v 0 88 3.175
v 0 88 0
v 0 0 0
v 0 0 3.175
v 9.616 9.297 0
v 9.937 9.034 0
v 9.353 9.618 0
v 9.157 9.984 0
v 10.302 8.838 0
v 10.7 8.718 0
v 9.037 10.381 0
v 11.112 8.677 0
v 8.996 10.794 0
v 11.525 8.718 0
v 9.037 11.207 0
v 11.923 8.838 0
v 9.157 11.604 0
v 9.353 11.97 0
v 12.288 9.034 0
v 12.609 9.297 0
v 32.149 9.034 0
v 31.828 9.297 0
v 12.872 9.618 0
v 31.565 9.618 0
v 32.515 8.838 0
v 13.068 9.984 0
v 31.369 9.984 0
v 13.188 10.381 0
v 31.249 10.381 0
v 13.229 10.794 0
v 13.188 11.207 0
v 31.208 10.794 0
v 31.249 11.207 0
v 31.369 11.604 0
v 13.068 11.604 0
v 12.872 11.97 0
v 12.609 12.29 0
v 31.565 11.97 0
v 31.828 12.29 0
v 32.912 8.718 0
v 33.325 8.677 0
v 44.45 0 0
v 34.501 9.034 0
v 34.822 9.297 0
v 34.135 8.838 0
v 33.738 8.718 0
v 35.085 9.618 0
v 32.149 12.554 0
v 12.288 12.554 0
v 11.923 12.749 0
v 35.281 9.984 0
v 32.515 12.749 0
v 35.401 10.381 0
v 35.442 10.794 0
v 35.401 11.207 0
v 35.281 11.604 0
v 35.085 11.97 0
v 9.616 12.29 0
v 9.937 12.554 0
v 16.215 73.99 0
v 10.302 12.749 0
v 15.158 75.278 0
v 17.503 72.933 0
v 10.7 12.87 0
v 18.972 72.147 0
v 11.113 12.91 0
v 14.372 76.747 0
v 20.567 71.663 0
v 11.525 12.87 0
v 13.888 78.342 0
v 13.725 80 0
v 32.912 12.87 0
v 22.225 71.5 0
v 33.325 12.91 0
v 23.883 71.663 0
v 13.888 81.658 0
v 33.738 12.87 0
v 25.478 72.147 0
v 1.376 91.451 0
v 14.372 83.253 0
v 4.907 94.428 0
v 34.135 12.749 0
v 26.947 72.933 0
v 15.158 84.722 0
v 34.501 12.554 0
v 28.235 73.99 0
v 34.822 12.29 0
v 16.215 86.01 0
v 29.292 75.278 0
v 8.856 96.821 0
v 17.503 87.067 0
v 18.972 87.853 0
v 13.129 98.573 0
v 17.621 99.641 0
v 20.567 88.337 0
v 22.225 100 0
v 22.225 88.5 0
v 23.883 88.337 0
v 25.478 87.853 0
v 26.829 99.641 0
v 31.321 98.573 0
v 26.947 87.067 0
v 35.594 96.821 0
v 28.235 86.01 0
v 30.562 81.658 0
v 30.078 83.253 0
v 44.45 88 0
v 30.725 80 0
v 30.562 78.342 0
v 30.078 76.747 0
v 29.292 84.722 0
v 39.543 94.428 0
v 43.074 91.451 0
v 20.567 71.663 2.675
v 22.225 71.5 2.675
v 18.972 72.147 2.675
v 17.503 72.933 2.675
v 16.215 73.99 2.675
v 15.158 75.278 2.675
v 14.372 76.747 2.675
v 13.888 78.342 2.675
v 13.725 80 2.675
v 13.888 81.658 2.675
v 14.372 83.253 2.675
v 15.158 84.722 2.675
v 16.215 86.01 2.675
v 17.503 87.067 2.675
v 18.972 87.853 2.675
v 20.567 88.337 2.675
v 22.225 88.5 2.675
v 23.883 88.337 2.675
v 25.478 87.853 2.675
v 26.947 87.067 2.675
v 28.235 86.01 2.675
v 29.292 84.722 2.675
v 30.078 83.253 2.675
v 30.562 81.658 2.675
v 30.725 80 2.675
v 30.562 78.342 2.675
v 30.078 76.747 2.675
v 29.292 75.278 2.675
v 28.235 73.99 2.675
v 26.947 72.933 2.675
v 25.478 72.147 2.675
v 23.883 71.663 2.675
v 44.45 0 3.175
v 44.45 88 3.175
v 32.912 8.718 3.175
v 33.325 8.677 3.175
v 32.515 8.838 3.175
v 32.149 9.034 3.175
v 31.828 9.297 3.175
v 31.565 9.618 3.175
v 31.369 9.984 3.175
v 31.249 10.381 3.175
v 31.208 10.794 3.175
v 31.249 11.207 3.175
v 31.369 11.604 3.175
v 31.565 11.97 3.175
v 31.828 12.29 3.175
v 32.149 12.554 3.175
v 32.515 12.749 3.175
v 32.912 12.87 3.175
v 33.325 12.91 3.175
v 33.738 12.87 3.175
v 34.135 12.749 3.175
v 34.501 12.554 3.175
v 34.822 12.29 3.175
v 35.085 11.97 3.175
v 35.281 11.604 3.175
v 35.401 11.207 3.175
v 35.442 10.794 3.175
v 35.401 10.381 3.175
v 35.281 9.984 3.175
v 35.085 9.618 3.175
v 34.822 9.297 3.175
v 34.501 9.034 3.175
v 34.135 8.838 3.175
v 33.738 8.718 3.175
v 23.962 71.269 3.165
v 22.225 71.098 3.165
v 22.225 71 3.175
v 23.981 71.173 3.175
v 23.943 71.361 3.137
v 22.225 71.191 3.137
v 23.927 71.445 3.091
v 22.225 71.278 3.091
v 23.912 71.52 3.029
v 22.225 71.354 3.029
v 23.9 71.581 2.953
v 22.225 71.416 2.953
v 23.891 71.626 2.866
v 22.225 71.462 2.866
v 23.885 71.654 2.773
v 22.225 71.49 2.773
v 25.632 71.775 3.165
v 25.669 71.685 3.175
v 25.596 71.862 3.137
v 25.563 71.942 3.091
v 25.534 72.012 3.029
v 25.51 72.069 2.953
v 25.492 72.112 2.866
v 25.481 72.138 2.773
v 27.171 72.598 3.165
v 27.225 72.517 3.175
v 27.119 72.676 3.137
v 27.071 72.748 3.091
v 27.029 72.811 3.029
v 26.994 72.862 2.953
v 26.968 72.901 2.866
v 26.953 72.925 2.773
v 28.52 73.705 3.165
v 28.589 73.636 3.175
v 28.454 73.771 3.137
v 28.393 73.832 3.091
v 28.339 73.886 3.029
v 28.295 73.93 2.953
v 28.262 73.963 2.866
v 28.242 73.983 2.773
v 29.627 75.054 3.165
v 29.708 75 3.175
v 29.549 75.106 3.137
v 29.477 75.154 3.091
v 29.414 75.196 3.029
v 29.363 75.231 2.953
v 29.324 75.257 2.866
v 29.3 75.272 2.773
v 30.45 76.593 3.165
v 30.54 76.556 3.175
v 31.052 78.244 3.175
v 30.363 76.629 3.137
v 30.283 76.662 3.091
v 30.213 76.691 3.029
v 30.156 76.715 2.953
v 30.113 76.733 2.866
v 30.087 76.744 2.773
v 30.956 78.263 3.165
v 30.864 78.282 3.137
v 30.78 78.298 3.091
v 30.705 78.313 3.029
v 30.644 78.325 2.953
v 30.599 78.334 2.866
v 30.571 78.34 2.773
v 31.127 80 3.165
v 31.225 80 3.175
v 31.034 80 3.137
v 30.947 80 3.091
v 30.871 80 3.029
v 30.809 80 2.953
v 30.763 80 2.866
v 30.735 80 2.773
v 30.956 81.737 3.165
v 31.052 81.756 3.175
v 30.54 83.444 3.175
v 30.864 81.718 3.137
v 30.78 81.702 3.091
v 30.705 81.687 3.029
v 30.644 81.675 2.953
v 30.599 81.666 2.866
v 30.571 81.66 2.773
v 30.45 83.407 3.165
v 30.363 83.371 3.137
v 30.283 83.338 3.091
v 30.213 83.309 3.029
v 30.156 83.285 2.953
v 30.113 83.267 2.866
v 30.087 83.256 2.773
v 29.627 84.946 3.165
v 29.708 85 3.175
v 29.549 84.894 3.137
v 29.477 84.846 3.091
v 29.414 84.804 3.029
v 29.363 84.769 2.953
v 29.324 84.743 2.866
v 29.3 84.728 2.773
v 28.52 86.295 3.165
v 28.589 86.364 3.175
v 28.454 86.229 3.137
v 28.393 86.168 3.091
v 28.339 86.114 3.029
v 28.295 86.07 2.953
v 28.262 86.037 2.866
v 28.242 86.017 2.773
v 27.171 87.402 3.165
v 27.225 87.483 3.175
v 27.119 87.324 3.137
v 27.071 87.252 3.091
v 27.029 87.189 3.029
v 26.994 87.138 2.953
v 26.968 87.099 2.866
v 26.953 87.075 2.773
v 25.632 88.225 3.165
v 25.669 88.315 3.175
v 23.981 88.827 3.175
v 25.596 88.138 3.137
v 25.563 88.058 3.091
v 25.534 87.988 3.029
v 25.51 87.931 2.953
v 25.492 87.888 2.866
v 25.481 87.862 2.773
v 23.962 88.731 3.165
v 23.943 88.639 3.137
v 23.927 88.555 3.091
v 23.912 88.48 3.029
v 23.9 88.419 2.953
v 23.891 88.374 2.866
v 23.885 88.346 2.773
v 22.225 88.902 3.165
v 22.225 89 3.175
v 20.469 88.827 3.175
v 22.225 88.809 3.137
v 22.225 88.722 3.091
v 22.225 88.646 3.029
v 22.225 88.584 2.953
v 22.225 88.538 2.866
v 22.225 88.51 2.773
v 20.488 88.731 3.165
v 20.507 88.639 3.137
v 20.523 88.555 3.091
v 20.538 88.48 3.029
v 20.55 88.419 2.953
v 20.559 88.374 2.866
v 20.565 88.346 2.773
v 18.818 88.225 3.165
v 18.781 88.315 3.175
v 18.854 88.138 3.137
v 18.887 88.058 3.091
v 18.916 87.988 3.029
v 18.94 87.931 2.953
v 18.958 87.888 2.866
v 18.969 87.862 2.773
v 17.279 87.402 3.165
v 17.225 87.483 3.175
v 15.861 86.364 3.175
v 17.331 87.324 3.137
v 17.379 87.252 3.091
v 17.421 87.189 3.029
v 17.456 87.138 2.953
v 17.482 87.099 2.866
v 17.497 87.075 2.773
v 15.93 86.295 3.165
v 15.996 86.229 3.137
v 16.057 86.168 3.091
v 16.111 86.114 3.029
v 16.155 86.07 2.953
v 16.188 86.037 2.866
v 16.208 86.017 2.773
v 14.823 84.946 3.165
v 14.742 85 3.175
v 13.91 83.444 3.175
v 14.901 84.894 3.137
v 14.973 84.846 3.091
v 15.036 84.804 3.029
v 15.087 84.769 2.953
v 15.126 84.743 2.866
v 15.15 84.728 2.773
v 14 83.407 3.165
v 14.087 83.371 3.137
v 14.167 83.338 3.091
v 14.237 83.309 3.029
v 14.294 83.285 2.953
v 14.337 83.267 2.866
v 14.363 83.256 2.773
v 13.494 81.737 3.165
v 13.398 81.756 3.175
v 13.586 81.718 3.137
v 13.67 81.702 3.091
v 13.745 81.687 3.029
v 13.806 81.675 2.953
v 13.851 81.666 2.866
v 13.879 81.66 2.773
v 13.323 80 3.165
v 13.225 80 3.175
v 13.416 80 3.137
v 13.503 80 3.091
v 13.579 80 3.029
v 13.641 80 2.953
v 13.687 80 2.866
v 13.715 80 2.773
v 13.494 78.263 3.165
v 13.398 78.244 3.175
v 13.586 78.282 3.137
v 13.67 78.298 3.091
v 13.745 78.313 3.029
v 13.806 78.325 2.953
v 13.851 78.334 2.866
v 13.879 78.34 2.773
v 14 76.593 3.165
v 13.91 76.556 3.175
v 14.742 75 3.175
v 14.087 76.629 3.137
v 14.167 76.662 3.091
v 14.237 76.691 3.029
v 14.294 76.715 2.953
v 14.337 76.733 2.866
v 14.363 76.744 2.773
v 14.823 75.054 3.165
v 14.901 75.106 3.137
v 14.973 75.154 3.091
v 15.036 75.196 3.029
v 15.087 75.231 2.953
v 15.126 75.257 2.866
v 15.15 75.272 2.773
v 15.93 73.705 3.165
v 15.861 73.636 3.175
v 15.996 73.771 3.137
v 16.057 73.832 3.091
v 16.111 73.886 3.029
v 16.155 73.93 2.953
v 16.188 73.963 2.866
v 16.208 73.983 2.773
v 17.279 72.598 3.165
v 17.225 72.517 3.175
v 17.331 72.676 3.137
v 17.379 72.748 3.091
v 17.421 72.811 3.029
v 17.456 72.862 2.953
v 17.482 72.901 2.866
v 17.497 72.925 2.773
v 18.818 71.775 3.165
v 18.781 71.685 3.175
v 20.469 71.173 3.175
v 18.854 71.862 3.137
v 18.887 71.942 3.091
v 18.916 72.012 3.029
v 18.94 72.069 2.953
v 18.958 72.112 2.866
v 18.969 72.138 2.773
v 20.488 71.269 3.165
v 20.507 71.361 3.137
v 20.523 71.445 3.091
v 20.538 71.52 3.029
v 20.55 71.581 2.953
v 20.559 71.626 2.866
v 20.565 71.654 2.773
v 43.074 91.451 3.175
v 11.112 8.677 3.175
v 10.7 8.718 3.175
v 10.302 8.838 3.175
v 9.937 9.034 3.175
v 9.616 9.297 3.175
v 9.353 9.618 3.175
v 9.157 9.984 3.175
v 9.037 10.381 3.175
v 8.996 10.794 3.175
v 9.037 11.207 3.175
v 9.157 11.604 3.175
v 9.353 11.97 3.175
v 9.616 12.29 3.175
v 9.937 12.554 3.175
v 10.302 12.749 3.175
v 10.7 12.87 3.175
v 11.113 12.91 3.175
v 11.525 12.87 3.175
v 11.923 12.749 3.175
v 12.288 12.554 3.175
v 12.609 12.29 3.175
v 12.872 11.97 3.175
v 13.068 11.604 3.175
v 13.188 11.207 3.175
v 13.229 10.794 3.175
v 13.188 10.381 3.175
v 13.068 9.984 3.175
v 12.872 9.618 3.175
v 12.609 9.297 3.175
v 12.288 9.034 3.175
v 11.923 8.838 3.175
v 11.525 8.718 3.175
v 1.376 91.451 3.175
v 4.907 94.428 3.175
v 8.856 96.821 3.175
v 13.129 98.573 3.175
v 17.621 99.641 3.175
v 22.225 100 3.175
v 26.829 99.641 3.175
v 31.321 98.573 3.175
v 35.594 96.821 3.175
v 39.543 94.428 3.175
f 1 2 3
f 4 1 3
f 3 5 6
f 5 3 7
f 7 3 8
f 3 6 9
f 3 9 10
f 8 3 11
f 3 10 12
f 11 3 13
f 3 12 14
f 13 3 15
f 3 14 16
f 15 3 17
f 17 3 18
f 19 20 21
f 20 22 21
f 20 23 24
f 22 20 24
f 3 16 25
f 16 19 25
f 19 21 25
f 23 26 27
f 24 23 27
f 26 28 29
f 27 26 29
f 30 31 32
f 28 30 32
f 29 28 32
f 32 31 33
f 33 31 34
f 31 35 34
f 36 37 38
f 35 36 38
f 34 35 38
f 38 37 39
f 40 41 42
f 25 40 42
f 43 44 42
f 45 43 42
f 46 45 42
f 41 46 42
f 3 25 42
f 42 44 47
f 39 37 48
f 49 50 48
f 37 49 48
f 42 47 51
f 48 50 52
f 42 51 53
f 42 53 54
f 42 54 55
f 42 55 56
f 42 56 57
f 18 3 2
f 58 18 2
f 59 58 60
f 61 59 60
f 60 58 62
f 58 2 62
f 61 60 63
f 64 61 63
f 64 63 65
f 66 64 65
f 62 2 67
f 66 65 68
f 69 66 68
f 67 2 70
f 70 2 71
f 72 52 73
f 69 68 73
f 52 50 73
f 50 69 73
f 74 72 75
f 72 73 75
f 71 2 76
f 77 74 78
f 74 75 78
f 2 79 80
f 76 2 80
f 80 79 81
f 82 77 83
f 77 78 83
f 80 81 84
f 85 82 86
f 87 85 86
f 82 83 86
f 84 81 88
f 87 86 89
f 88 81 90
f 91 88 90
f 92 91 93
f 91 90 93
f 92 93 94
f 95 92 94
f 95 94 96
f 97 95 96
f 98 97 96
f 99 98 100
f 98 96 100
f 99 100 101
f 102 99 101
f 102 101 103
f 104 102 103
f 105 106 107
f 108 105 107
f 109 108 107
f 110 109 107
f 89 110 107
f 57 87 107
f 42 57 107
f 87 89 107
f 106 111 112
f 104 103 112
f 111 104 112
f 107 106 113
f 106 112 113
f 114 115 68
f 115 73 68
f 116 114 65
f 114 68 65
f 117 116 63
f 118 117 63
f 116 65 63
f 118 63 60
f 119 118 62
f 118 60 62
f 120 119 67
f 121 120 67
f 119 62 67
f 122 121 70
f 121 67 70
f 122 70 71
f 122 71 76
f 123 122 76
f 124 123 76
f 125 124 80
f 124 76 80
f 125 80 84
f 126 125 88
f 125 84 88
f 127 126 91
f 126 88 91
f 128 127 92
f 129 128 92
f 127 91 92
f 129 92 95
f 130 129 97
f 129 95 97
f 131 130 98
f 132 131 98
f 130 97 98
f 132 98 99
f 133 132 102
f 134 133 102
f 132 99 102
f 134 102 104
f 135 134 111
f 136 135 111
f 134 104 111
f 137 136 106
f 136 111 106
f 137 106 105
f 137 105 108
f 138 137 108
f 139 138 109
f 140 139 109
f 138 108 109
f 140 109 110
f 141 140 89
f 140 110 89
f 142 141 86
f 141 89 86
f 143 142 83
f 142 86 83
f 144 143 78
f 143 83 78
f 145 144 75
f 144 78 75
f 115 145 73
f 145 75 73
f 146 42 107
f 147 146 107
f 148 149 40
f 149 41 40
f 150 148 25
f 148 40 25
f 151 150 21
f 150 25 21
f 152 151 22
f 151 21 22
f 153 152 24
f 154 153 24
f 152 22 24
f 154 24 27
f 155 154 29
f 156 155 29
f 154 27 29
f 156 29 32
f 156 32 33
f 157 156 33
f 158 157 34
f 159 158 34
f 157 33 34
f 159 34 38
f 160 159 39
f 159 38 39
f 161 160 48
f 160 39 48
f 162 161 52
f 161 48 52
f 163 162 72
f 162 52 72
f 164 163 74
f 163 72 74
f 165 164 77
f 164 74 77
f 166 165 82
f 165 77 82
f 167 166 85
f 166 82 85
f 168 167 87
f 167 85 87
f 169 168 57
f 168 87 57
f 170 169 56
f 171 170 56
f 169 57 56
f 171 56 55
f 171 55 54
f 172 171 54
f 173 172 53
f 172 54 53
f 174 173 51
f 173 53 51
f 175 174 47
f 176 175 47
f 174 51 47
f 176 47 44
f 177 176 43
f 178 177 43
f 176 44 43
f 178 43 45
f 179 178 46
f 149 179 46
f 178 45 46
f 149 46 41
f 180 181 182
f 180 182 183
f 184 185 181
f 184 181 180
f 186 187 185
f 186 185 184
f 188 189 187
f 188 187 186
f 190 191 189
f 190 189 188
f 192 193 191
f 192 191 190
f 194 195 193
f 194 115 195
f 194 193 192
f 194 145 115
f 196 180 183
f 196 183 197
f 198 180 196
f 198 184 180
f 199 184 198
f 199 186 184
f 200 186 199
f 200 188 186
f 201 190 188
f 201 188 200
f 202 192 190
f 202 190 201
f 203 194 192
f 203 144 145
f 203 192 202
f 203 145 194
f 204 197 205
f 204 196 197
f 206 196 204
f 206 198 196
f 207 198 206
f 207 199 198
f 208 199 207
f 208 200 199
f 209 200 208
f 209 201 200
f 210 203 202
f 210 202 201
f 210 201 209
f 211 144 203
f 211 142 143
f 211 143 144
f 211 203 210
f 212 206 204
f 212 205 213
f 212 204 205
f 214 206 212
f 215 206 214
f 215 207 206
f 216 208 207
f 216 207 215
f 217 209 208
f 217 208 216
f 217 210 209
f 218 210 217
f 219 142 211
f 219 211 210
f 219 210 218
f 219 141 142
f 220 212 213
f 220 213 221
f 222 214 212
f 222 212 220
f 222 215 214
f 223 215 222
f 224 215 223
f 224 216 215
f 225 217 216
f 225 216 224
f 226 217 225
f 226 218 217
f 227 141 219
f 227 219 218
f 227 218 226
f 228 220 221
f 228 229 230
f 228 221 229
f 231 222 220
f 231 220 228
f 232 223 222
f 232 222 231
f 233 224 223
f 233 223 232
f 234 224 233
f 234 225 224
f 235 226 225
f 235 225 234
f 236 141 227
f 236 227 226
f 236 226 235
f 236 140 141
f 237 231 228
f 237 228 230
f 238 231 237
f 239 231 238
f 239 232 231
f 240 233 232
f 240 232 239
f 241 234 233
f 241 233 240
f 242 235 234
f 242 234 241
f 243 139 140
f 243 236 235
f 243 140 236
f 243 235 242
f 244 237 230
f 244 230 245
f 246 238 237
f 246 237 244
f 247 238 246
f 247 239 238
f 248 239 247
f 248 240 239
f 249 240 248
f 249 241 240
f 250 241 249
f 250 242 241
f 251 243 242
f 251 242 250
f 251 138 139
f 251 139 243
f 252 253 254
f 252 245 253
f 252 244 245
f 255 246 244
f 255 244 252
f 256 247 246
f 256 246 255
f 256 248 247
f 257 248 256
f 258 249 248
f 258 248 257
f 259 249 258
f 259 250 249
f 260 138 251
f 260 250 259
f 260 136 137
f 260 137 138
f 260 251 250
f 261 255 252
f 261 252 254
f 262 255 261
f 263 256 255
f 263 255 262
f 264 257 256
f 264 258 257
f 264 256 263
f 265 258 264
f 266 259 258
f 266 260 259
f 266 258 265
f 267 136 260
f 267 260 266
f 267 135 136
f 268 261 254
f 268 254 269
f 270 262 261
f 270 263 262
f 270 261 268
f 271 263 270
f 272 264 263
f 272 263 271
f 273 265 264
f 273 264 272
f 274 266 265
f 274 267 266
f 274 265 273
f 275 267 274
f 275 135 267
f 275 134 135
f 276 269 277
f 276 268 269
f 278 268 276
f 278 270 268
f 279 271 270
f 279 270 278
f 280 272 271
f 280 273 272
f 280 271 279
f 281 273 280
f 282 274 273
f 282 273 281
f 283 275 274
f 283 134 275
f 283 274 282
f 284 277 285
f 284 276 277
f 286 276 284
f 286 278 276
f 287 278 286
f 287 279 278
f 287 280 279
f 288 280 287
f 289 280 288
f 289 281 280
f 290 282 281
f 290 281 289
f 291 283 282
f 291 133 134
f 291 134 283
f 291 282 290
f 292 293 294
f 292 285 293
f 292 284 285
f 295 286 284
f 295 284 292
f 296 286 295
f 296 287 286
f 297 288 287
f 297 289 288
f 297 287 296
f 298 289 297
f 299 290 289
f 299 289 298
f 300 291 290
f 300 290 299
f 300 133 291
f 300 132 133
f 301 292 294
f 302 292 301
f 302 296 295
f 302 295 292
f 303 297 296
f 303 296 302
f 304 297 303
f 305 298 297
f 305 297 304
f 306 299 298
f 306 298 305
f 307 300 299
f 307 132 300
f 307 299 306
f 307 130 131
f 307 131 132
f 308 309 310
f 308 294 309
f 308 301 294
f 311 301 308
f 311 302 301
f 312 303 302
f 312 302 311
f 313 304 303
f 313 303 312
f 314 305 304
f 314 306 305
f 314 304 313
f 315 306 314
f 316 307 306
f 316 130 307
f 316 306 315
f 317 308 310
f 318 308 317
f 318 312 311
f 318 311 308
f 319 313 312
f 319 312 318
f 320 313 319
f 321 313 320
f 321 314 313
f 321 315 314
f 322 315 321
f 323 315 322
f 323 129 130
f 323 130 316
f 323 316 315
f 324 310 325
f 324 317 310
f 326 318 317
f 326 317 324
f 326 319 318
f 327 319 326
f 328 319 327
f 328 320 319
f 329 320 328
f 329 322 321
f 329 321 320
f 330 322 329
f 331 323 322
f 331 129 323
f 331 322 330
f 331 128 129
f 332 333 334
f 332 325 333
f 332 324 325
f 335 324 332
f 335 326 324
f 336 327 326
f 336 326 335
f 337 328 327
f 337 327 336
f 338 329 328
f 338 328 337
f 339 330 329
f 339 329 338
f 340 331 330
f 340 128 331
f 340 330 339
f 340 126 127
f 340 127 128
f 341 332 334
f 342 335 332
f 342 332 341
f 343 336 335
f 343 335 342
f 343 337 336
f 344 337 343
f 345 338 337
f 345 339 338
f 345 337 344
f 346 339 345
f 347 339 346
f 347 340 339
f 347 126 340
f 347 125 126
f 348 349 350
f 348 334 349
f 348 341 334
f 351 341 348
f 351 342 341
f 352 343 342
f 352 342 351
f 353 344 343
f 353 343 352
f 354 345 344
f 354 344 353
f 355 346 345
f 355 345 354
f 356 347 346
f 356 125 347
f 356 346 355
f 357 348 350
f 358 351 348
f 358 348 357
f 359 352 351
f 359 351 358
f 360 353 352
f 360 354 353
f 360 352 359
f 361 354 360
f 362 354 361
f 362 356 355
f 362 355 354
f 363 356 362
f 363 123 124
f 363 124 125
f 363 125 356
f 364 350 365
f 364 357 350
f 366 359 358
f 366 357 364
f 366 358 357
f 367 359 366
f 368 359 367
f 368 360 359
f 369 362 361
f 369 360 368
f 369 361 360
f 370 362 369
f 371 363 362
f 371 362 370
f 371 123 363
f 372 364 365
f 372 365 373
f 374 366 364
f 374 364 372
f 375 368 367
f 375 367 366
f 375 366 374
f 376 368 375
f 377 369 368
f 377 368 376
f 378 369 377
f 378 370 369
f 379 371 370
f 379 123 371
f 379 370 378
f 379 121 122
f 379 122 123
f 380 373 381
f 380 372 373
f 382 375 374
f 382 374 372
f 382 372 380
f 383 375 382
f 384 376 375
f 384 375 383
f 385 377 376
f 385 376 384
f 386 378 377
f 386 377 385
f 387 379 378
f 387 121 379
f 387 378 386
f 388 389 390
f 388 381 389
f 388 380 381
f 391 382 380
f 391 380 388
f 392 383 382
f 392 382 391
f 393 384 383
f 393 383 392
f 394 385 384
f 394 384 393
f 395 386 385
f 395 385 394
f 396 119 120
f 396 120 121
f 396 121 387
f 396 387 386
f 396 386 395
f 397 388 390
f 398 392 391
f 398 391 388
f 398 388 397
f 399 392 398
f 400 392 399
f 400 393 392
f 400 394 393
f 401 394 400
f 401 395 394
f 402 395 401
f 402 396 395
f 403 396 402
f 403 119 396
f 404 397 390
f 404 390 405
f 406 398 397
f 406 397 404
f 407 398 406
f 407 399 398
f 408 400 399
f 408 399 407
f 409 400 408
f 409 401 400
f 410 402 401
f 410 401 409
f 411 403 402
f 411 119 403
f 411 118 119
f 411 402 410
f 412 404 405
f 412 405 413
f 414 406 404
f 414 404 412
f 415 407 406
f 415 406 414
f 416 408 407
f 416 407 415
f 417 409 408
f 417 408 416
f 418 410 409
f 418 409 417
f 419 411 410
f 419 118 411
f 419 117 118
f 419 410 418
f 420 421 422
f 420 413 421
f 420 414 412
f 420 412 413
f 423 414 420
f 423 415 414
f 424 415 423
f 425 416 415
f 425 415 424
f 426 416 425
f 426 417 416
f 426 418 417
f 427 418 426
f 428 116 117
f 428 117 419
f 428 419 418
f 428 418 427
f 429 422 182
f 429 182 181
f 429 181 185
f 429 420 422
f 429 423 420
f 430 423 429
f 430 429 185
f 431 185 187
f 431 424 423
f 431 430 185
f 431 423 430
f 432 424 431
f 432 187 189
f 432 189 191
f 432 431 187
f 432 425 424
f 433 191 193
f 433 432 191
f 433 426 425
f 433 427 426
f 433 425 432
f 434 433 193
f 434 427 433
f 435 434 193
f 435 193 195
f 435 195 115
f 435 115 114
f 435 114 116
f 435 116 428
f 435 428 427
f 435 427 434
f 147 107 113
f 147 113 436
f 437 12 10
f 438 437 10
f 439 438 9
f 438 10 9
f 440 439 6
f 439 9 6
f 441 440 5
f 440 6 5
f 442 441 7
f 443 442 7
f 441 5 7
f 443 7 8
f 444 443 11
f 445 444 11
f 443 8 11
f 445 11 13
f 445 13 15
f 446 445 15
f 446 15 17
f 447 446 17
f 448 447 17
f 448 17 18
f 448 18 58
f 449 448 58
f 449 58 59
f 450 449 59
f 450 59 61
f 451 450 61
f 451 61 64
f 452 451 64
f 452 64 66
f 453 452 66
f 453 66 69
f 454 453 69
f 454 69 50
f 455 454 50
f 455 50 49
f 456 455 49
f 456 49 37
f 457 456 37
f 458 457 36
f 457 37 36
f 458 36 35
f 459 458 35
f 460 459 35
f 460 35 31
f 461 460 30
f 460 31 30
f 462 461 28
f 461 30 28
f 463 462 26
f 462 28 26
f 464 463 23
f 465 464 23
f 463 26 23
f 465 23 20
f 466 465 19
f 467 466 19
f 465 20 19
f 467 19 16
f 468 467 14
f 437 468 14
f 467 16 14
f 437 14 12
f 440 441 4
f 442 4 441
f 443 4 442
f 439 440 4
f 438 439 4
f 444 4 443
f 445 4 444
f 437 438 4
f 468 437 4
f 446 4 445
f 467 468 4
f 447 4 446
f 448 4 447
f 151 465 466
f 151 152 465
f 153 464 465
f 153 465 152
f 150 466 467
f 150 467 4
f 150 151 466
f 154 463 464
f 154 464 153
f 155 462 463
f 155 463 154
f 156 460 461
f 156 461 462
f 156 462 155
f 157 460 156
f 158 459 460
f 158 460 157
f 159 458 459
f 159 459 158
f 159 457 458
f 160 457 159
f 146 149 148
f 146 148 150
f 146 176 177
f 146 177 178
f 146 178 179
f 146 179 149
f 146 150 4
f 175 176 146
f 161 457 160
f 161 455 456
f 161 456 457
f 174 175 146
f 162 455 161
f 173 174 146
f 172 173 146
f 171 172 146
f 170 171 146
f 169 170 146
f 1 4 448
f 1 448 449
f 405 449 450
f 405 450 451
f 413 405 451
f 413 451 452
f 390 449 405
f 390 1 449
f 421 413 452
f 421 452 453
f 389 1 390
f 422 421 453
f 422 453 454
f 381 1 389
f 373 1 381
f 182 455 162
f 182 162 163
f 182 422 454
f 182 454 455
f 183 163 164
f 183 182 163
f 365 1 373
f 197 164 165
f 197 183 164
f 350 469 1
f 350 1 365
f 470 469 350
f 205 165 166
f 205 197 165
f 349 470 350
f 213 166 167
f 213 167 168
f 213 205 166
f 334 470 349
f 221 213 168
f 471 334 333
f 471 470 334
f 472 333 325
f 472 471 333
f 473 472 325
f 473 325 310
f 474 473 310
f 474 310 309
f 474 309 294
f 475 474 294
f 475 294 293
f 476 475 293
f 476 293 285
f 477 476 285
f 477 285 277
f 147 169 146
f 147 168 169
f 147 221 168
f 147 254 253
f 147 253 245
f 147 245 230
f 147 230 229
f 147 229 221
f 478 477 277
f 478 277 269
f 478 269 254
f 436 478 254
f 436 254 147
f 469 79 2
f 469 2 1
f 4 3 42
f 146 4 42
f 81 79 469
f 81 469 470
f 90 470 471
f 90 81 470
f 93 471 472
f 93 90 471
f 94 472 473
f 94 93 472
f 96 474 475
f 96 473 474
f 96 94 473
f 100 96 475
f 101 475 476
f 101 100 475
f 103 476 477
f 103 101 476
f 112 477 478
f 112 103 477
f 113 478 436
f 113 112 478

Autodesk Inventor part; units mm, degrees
ref_plane "YZ Plane" through (0, 0, 0) normal (1, 0, 0) x (0, 1, 0)
ref_plane "XZ Plane" through (0, 0, 0) normal (0, 1, 0) x (-1, 0, 0)
ref_plane "XY Plane" through (0, 0, 0) normal (0, 0, 1) x (1, 0, 0)
sketch "Sketch2" plane through (0, 0, 0) normal (0, 0, 1) x (1, 0, 0)
  line L0 (0, 0) -> (44.45, 0)
  line L1 (44.45, 0) -> (44.45, 90)
  line L2 (0, 90) -> (0, 0)
  arc A0 (44.45, 90) -> (0, 90) centre (22.225, 70.3025) ccw
  dimension "d3" = 44.45
  dimension "d4" = 100
  dimension "d5" = 90
extrude "Extrusion1" add sketch "Sketch2" along normal blind 3.175
chamfer "Chamfer1" distance 2 angle 45 2 edges at (44.45, 90, 1.5875) (0, 90, 1.5875)
sketch "Sketch3" plane through (0, 0, 3.175) normal (0, 0, 1) x (1, 0, 0)
  line L0 (0, 88) -> (0, 0) projected
  line L1 (0, 0) -> (44.45, 0) projected
  point P0 (22.225, 80)
  point P1 (22.225, 0)
  dimension "d13" = 80
hole "Hole1" at (22.225, 80, 3.175) direction (0, 0, -1) diameter 17 end through all
fillet "Fillet1" radius 0.5 1 edges at (22.225, 88.5, 3.175)
sketch "Sketch4" plane through (0, 0, 3.175) normal (0, 0, 1) x (1, 0, 0)
  line L0 (0, 0) -> (44.45, 0) projected
  line L1 (0, 88) -> (0, 0) projected
  line L2 (44.45, 0) -> (44.45, 88) projected
  point P0 (11.1125, 10.7938)
  point P1 (33.325, 10.7938)
  dimension "d22" = 44.45
  dimension "d23" = 11.1125
  dimension "d24" = 11.125
hole "Hole2" at (11.1125, 10.7938, 3.175) at (33.325, 10.7938, 3.175) direction (0, 0, -1) diameter 4.2333 end through all
properties part number "platen_support"
